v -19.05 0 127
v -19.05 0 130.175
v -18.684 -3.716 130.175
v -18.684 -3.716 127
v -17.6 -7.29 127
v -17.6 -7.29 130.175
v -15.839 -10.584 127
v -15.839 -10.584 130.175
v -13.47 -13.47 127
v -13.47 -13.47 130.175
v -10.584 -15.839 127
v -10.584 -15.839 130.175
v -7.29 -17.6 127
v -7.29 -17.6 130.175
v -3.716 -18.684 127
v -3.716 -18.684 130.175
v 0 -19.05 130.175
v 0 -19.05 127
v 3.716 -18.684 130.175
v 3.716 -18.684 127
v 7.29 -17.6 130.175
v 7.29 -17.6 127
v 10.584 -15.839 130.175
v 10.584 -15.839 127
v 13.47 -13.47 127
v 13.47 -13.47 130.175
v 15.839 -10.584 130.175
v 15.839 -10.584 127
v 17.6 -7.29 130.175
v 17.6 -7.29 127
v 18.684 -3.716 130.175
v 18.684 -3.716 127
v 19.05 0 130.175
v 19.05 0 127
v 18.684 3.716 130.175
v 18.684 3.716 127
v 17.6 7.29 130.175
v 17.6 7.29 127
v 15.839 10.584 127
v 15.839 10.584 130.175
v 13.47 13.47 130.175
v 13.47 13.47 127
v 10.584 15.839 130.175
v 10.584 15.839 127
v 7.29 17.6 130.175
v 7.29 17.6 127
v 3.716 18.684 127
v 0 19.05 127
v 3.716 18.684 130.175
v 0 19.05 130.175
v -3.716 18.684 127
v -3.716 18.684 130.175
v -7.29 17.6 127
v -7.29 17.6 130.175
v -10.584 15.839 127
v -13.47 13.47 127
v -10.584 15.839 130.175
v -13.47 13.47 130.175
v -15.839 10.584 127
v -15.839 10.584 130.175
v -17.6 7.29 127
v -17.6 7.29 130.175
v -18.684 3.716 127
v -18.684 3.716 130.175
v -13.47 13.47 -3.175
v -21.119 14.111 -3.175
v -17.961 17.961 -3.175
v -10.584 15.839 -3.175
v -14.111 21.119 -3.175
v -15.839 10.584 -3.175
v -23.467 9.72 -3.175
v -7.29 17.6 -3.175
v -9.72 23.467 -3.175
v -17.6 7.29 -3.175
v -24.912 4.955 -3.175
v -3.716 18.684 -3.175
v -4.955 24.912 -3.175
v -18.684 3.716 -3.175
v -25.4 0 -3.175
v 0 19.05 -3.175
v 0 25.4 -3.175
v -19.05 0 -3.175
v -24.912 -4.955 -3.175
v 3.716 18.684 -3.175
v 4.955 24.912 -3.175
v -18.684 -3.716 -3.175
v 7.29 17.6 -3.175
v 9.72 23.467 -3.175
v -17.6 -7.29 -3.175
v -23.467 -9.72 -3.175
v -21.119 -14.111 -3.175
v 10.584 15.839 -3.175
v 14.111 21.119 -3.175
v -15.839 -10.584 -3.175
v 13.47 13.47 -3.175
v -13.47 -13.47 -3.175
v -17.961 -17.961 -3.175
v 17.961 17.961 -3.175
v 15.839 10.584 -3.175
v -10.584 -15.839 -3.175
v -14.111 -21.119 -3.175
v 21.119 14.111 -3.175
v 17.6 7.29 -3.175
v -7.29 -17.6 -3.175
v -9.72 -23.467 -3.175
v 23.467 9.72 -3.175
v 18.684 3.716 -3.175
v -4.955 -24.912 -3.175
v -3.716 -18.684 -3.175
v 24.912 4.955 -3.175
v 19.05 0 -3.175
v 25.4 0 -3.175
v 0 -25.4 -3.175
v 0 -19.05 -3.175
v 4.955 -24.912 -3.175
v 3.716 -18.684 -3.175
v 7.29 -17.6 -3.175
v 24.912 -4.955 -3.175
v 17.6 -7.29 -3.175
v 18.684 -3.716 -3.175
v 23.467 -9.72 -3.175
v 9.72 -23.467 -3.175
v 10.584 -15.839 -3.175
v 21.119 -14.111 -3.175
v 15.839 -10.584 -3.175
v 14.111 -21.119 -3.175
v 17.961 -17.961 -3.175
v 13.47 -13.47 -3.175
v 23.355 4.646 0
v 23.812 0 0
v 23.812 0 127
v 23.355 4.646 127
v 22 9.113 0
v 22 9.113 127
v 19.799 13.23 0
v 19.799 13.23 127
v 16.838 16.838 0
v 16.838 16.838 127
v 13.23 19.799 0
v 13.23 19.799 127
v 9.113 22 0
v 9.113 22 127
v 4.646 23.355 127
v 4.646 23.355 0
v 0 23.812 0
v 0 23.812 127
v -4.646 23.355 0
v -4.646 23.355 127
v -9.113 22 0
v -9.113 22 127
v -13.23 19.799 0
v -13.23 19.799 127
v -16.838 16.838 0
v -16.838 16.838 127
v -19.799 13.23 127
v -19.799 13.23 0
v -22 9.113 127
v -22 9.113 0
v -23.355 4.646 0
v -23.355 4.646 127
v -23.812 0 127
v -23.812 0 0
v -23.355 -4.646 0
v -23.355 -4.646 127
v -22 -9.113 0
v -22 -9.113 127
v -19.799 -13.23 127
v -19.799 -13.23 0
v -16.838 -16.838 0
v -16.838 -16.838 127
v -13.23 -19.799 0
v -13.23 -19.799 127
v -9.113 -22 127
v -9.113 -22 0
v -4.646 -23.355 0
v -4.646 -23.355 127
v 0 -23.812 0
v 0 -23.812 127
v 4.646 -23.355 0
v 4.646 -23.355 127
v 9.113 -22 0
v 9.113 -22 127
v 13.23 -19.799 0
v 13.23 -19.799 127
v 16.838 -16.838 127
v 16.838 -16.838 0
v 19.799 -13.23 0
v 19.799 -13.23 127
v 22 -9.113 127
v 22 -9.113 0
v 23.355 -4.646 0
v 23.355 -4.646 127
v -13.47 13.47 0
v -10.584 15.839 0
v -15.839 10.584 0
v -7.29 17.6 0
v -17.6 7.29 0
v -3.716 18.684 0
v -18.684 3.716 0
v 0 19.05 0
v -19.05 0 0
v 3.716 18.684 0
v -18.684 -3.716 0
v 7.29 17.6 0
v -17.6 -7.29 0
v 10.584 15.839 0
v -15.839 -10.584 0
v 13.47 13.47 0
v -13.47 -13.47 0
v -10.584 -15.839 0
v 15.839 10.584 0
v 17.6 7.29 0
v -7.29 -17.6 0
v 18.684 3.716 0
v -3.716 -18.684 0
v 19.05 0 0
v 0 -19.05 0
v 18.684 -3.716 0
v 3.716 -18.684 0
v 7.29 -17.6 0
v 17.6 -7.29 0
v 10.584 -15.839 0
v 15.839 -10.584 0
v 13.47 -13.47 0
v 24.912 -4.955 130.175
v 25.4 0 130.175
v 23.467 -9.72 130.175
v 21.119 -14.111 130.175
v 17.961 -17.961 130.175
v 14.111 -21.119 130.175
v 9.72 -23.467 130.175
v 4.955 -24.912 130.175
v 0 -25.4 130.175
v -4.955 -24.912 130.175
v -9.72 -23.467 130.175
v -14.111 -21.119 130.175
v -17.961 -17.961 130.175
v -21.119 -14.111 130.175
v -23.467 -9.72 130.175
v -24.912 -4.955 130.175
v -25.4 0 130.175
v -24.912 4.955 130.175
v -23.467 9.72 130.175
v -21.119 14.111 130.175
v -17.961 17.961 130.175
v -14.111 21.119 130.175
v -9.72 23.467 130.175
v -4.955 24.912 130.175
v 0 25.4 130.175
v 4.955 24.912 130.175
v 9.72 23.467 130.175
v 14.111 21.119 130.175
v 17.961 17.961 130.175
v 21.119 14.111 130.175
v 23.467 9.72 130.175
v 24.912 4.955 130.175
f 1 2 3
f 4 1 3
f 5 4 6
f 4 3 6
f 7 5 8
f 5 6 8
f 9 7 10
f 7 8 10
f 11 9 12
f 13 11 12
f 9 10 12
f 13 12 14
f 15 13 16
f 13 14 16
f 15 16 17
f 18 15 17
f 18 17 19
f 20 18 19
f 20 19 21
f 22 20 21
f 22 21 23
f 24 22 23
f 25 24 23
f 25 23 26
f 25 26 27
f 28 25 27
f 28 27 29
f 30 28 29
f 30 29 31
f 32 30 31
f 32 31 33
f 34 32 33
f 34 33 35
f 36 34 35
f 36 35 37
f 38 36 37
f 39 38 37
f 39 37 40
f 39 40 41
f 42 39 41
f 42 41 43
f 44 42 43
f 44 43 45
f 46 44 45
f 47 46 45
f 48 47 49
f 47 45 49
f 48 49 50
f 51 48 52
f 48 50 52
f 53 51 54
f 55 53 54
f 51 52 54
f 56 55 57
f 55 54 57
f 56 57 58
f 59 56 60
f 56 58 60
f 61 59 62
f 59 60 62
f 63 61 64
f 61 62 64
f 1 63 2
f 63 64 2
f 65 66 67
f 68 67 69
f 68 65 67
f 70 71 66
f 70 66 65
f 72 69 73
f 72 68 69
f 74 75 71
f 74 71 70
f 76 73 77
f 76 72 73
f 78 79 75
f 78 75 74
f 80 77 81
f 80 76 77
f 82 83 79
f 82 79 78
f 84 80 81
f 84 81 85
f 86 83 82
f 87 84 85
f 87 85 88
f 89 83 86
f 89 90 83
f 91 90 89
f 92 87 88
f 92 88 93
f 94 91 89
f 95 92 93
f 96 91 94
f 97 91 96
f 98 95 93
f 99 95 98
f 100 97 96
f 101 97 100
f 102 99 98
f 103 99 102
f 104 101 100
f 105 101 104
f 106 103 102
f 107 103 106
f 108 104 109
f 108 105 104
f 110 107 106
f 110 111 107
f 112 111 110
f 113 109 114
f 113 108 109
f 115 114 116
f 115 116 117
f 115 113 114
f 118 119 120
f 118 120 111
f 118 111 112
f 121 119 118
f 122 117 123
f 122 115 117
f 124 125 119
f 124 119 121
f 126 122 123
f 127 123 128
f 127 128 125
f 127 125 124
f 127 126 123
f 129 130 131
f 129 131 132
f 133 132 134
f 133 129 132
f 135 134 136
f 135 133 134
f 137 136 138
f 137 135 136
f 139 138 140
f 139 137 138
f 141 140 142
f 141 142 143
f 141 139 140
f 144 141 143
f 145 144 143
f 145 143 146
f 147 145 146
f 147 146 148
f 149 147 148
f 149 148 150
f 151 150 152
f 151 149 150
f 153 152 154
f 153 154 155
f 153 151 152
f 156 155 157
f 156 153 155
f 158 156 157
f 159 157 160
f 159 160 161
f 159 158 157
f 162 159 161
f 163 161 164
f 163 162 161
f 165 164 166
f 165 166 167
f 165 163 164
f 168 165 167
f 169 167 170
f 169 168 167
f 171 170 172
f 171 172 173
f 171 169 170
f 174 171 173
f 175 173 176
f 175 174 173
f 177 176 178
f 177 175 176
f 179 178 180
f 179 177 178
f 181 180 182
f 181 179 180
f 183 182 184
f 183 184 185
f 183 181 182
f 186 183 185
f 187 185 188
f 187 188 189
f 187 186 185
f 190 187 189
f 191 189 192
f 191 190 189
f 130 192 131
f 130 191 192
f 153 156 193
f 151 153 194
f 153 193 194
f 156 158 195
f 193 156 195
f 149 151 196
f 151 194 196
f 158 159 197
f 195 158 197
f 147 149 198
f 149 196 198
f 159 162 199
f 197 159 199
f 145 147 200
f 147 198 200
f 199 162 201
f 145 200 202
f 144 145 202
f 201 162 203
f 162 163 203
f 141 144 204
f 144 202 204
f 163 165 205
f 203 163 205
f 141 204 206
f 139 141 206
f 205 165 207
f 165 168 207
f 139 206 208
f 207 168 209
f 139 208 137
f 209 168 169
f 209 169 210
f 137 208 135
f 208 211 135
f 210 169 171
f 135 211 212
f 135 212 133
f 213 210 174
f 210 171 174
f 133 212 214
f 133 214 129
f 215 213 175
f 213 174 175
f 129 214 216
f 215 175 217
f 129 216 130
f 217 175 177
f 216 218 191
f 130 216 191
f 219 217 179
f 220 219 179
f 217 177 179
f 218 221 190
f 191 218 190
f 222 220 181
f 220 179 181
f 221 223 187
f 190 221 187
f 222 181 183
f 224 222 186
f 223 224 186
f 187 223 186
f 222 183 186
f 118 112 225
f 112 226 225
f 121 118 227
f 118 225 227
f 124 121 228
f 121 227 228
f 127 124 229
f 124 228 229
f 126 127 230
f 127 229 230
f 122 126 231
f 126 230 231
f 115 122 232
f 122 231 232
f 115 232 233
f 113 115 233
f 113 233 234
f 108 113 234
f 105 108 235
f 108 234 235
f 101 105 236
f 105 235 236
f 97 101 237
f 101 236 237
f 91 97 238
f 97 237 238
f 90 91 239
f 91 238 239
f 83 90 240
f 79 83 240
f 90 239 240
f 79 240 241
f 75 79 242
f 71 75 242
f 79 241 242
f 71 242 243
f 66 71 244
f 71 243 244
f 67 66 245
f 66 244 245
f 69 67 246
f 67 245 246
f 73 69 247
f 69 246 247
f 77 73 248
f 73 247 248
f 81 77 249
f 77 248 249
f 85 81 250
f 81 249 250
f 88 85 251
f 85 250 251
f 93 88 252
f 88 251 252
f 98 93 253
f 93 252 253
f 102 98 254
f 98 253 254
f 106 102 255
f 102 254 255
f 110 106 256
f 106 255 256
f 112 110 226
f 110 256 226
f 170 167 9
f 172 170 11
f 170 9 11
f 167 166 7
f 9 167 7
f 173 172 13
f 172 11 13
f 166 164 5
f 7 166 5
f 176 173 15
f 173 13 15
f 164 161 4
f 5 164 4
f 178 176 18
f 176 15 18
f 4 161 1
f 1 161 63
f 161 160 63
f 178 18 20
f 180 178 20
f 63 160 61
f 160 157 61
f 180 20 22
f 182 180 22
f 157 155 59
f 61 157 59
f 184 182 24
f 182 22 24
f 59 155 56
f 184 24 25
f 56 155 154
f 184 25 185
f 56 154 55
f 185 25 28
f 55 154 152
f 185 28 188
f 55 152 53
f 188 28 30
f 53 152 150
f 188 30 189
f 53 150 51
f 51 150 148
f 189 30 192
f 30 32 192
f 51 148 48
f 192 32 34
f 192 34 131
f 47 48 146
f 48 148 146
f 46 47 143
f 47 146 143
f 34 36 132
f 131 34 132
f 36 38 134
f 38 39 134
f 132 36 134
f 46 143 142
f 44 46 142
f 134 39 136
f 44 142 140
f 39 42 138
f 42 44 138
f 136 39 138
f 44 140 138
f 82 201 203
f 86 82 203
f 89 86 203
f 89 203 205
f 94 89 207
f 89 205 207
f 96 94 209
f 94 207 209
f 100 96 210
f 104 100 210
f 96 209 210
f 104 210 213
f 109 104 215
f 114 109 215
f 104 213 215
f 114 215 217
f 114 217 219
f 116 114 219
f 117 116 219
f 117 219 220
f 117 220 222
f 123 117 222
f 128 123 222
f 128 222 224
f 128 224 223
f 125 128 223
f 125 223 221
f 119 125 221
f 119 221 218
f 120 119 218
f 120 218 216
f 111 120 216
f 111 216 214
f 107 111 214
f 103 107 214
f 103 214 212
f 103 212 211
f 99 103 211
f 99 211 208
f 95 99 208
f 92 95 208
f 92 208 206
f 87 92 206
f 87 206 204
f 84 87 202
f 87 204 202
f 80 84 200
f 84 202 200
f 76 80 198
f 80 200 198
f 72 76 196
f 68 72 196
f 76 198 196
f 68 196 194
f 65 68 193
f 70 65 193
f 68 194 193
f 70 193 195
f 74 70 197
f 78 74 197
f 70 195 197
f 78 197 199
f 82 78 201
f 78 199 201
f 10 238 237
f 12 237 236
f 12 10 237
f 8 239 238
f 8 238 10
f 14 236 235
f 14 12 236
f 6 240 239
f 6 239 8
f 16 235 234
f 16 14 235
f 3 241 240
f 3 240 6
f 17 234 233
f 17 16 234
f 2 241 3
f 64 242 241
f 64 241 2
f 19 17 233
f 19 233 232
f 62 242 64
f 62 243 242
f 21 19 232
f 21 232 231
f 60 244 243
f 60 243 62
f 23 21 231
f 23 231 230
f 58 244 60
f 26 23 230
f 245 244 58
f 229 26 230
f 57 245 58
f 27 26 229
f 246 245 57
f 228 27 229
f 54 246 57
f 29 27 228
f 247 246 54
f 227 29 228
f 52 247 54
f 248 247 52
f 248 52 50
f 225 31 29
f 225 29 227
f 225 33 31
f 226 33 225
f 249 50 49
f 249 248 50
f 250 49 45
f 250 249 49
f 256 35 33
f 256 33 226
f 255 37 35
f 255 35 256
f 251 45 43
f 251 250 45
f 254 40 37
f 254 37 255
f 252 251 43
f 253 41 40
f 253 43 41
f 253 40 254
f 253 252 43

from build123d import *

# Parameters (mm, degrees)
F0_R     = 25.4
F0_R_2   = 23.8125
F1_DEPTH = 127
F2_R     = 25.4
F3_DEPTH = 3.175
F4_R     = 25.4
F5_DEPTH = 3.175
F7_D     = 38.1


with BuildPart() as f1:
    # F0 (on Top) → F1 (new body)
    with BuildSketch(Plane.XY):
        Circle(F0_R)
        Circle(F0_R_2, mode=Mode.SUBTRACT)
    extrude(amount=F1_DEPTH)

    # F2 (on face) → F3 (join)
    with BuildSketch(Plane.XY.offset(127)):
        Circle(F2_R)
    extrude(amount=F3_DEPTH)

    # F4 (on face) → F5 (join)
    with BuildSketch(Plane(origin=(0, 0, 0), x_dir=(1, 0, 0), z_dir=(0, 0, -1))):
        Circle(F4_R)
    extrude(amount=F5_DEPTH)

    # F7 (through all)
    with Locations(Plane(origin=(0, 0, -3.175), x_dir=(1, 0, 0), z_dir=(0, 0, -1))):
        with Locations((0, 0)):
            Hole(F7_D / 2)


solid = f1.part
